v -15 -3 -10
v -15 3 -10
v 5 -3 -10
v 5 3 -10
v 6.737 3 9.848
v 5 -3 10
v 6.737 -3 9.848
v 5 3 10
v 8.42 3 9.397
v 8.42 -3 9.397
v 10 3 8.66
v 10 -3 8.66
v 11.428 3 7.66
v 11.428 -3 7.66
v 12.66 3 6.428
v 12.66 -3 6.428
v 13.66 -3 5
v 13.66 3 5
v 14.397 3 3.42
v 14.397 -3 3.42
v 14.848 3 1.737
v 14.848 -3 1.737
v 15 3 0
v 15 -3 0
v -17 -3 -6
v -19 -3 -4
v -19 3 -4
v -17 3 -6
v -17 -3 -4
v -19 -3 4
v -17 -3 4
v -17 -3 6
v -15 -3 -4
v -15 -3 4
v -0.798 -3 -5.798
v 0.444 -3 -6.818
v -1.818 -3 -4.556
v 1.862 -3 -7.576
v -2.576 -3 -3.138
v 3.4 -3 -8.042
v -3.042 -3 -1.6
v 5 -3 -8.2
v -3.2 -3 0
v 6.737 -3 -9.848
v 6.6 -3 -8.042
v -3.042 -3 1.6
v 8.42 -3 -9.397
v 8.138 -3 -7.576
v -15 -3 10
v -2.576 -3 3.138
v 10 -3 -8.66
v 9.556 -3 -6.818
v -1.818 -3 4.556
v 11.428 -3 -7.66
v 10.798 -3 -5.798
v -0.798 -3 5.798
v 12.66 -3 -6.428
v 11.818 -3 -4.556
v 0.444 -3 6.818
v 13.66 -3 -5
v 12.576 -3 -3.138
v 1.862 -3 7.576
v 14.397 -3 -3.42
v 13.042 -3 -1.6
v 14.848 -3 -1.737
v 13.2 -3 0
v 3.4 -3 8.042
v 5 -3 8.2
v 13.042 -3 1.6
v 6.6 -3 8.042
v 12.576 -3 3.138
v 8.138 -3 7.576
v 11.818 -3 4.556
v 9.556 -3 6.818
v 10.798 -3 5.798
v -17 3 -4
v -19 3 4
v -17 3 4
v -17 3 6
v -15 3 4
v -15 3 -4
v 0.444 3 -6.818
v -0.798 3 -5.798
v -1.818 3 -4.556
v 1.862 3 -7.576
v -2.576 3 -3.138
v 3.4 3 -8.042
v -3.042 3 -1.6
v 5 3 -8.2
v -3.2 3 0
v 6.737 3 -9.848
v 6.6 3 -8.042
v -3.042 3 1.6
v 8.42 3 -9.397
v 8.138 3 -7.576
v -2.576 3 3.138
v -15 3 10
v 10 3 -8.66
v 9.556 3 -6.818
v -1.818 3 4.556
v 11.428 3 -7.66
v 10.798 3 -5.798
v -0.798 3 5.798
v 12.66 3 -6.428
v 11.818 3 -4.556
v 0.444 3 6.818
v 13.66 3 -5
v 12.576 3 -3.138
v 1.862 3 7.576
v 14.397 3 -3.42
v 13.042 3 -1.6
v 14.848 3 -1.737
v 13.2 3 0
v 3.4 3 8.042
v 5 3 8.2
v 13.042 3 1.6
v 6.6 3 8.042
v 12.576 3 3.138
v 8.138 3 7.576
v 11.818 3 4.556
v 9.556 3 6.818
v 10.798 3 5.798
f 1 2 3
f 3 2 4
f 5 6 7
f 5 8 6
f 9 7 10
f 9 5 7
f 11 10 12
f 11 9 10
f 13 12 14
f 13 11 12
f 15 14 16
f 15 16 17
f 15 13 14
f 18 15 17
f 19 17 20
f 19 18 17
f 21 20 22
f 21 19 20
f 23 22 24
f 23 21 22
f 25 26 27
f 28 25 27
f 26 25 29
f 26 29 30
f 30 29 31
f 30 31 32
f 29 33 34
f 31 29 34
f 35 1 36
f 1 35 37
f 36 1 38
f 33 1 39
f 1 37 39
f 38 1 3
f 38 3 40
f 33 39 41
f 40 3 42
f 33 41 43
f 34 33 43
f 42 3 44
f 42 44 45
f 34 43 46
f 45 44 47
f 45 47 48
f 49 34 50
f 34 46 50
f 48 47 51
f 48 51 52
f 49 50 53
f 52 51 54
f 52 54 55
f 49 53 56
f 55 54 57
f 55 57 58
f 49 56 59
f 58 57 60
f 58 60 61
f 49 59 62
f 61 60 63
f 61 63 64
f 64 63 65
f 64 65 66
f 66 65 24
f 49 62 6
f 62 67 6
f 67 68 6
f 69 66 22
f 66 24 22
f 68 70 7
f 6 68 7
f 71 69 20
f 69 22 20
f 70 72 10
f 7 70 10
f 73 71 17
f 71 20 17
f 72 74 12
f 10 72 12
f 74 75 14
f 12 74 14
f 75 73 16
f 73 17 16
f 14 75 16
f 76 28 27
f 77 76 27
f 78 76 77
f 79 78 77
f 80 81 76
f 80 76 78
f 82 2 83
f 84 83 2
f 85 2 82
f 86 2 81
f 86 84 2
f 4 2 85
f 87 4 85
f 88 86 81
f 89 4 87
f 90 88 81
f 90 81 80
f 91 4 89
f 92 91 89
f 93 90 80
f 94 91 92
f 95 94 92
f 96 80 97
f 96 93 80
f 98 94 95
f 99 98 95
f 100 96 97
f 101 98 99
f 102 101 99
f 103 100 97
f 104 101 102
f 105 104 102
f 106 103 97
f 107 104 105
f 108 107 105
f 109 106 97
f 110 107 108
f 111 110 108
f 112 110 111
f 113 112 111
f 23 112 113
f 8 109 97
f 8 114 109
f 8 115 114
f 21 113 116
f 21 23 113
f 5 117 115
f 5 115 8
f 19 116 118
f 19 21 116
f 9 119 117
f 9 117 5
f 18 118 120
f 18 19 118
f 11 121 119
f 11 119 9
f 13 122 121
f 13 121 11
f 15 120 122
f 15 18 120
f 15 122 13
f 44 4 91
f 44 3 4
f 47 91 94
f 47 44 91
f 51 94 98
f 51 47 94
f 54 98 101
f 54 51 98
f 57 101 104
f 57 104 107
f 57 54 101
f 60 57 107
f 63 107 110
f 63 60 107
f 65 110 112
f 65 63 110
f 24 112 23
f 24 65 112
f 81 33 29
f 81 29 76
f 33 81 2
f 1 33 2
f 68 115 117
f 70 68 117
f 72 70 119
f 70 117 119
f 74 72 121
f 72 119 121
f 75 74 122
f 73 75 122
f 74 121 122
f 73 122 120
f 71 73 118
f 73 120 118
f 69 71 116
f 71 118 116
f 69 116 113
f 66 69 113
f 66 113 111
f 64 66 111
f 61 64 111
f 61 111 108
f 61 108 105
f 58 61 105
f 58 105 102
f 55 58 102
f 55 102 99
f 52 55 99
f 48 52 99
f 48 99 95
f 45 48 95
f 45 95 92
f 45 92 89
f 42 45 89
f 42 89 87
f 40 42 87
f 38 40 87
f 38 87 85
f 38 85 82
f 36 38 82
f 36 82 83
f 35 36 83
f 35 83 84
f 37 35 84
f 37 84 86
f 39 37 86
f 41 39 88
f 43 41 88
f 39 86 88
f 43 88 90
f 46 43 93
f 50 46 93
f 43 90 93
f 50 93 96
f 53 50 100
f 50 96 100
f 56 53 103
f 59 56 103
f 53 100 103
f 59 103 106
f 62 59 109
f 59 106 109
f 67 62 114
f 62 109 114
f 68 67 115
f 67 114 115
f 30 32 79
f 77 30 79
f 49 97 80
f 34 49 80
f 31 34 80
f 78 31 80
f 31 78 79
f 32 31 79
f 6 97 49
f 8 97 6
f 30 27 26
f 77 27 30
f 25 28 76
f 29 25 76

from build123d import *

# Parameters (mm, degrees)
ESBO_O1_W                = 30
ESBO_O1_H                = 20
RESSALTO_EXTRUS_O1_DEPTH = 3
ESBO_O2_R                = 8.2
CORTE_EXTRUS_O1_DEPTH    = 20
FILETE1_R                = 10
ESBO_O3_W                = 8
ESBO_O3_H                = 6
RESSALTO_EXTRUS_O2_DEPTH = 2
ESBO_O4_W                = 12
ESBO_O4_H                = 6
RESSALTO_EXTRUS_O3_DEPTH = 2
CHANFRO1_SIZE            = 2


with BuildPart() as part:
    # Esboço1 → Ressalto-extrusão1 (new, symmetric)
    with BuildSketch(Plane(origin=(0, 0, 0), x_dir=(1, 0, 0), z_dir=(0, 1, 0))):
        Rectangle(ESBO_O1_W, ESBO_O1_H)
    extrude(amount=RESSALTO_EXTRUS_O1_DEPTH, both=True)

    # Esboço2 → Corte-extrusão1 (cut, through all)
    with BuildSketch(Plane(origin=(0, 3, 0), x_dir=(1, 0, 0), z_dir=(0, 1, 0))):
        with Locations(Location((5, 0, 0), (0, 0, 270))):
            Circle(ESBO_O2_R)
    extrude(amount=-CORTE_EXTRUS_O1_DEPTH, mode=Mode.SUBTRACT)

    # Filete1
    filete1_edges = [part.edges().sort_by_distance(p)[0] for p in [
        (15, 0, -10),
        (15, 0, 10),
    ]]
    fillet(filete1_edges, radius=FILETE1_R - 0.0001)  # a hair under: the kernel refuses the full size

    # Esboço3 → Ressalto-extrusão2 (add)
    with BuildSketch(Plane.ZY.offset(15)):
        Rectangle(ESBO_O3_W, ESBO_O3_H)
    extrude(amount=RESSALTO_EXTRUS_O2_DEPTH)

    # Esboço4 → Ressalto-extrusão3 (add)
    with BuildSketch(Plane.ZY.offset(17)):
        Rectangle(ESBO_O4_W, ESBO_O4_H)
    extrude(amount=RESSALTO_EXTRUS_O3_DEPTH)

    # Chanfro1
    chanfro1_edges = [part.edges().sort_by_distance(p)[0] for p in [
        (-19, 0, 6),
        (-19, 0, -6),
    ]]
    chamfer(chanfro1_edges, length=CHANFRO1_SIZE - 0.0001)  # a hair under: the kernel refuses the full size


solid = part.part
